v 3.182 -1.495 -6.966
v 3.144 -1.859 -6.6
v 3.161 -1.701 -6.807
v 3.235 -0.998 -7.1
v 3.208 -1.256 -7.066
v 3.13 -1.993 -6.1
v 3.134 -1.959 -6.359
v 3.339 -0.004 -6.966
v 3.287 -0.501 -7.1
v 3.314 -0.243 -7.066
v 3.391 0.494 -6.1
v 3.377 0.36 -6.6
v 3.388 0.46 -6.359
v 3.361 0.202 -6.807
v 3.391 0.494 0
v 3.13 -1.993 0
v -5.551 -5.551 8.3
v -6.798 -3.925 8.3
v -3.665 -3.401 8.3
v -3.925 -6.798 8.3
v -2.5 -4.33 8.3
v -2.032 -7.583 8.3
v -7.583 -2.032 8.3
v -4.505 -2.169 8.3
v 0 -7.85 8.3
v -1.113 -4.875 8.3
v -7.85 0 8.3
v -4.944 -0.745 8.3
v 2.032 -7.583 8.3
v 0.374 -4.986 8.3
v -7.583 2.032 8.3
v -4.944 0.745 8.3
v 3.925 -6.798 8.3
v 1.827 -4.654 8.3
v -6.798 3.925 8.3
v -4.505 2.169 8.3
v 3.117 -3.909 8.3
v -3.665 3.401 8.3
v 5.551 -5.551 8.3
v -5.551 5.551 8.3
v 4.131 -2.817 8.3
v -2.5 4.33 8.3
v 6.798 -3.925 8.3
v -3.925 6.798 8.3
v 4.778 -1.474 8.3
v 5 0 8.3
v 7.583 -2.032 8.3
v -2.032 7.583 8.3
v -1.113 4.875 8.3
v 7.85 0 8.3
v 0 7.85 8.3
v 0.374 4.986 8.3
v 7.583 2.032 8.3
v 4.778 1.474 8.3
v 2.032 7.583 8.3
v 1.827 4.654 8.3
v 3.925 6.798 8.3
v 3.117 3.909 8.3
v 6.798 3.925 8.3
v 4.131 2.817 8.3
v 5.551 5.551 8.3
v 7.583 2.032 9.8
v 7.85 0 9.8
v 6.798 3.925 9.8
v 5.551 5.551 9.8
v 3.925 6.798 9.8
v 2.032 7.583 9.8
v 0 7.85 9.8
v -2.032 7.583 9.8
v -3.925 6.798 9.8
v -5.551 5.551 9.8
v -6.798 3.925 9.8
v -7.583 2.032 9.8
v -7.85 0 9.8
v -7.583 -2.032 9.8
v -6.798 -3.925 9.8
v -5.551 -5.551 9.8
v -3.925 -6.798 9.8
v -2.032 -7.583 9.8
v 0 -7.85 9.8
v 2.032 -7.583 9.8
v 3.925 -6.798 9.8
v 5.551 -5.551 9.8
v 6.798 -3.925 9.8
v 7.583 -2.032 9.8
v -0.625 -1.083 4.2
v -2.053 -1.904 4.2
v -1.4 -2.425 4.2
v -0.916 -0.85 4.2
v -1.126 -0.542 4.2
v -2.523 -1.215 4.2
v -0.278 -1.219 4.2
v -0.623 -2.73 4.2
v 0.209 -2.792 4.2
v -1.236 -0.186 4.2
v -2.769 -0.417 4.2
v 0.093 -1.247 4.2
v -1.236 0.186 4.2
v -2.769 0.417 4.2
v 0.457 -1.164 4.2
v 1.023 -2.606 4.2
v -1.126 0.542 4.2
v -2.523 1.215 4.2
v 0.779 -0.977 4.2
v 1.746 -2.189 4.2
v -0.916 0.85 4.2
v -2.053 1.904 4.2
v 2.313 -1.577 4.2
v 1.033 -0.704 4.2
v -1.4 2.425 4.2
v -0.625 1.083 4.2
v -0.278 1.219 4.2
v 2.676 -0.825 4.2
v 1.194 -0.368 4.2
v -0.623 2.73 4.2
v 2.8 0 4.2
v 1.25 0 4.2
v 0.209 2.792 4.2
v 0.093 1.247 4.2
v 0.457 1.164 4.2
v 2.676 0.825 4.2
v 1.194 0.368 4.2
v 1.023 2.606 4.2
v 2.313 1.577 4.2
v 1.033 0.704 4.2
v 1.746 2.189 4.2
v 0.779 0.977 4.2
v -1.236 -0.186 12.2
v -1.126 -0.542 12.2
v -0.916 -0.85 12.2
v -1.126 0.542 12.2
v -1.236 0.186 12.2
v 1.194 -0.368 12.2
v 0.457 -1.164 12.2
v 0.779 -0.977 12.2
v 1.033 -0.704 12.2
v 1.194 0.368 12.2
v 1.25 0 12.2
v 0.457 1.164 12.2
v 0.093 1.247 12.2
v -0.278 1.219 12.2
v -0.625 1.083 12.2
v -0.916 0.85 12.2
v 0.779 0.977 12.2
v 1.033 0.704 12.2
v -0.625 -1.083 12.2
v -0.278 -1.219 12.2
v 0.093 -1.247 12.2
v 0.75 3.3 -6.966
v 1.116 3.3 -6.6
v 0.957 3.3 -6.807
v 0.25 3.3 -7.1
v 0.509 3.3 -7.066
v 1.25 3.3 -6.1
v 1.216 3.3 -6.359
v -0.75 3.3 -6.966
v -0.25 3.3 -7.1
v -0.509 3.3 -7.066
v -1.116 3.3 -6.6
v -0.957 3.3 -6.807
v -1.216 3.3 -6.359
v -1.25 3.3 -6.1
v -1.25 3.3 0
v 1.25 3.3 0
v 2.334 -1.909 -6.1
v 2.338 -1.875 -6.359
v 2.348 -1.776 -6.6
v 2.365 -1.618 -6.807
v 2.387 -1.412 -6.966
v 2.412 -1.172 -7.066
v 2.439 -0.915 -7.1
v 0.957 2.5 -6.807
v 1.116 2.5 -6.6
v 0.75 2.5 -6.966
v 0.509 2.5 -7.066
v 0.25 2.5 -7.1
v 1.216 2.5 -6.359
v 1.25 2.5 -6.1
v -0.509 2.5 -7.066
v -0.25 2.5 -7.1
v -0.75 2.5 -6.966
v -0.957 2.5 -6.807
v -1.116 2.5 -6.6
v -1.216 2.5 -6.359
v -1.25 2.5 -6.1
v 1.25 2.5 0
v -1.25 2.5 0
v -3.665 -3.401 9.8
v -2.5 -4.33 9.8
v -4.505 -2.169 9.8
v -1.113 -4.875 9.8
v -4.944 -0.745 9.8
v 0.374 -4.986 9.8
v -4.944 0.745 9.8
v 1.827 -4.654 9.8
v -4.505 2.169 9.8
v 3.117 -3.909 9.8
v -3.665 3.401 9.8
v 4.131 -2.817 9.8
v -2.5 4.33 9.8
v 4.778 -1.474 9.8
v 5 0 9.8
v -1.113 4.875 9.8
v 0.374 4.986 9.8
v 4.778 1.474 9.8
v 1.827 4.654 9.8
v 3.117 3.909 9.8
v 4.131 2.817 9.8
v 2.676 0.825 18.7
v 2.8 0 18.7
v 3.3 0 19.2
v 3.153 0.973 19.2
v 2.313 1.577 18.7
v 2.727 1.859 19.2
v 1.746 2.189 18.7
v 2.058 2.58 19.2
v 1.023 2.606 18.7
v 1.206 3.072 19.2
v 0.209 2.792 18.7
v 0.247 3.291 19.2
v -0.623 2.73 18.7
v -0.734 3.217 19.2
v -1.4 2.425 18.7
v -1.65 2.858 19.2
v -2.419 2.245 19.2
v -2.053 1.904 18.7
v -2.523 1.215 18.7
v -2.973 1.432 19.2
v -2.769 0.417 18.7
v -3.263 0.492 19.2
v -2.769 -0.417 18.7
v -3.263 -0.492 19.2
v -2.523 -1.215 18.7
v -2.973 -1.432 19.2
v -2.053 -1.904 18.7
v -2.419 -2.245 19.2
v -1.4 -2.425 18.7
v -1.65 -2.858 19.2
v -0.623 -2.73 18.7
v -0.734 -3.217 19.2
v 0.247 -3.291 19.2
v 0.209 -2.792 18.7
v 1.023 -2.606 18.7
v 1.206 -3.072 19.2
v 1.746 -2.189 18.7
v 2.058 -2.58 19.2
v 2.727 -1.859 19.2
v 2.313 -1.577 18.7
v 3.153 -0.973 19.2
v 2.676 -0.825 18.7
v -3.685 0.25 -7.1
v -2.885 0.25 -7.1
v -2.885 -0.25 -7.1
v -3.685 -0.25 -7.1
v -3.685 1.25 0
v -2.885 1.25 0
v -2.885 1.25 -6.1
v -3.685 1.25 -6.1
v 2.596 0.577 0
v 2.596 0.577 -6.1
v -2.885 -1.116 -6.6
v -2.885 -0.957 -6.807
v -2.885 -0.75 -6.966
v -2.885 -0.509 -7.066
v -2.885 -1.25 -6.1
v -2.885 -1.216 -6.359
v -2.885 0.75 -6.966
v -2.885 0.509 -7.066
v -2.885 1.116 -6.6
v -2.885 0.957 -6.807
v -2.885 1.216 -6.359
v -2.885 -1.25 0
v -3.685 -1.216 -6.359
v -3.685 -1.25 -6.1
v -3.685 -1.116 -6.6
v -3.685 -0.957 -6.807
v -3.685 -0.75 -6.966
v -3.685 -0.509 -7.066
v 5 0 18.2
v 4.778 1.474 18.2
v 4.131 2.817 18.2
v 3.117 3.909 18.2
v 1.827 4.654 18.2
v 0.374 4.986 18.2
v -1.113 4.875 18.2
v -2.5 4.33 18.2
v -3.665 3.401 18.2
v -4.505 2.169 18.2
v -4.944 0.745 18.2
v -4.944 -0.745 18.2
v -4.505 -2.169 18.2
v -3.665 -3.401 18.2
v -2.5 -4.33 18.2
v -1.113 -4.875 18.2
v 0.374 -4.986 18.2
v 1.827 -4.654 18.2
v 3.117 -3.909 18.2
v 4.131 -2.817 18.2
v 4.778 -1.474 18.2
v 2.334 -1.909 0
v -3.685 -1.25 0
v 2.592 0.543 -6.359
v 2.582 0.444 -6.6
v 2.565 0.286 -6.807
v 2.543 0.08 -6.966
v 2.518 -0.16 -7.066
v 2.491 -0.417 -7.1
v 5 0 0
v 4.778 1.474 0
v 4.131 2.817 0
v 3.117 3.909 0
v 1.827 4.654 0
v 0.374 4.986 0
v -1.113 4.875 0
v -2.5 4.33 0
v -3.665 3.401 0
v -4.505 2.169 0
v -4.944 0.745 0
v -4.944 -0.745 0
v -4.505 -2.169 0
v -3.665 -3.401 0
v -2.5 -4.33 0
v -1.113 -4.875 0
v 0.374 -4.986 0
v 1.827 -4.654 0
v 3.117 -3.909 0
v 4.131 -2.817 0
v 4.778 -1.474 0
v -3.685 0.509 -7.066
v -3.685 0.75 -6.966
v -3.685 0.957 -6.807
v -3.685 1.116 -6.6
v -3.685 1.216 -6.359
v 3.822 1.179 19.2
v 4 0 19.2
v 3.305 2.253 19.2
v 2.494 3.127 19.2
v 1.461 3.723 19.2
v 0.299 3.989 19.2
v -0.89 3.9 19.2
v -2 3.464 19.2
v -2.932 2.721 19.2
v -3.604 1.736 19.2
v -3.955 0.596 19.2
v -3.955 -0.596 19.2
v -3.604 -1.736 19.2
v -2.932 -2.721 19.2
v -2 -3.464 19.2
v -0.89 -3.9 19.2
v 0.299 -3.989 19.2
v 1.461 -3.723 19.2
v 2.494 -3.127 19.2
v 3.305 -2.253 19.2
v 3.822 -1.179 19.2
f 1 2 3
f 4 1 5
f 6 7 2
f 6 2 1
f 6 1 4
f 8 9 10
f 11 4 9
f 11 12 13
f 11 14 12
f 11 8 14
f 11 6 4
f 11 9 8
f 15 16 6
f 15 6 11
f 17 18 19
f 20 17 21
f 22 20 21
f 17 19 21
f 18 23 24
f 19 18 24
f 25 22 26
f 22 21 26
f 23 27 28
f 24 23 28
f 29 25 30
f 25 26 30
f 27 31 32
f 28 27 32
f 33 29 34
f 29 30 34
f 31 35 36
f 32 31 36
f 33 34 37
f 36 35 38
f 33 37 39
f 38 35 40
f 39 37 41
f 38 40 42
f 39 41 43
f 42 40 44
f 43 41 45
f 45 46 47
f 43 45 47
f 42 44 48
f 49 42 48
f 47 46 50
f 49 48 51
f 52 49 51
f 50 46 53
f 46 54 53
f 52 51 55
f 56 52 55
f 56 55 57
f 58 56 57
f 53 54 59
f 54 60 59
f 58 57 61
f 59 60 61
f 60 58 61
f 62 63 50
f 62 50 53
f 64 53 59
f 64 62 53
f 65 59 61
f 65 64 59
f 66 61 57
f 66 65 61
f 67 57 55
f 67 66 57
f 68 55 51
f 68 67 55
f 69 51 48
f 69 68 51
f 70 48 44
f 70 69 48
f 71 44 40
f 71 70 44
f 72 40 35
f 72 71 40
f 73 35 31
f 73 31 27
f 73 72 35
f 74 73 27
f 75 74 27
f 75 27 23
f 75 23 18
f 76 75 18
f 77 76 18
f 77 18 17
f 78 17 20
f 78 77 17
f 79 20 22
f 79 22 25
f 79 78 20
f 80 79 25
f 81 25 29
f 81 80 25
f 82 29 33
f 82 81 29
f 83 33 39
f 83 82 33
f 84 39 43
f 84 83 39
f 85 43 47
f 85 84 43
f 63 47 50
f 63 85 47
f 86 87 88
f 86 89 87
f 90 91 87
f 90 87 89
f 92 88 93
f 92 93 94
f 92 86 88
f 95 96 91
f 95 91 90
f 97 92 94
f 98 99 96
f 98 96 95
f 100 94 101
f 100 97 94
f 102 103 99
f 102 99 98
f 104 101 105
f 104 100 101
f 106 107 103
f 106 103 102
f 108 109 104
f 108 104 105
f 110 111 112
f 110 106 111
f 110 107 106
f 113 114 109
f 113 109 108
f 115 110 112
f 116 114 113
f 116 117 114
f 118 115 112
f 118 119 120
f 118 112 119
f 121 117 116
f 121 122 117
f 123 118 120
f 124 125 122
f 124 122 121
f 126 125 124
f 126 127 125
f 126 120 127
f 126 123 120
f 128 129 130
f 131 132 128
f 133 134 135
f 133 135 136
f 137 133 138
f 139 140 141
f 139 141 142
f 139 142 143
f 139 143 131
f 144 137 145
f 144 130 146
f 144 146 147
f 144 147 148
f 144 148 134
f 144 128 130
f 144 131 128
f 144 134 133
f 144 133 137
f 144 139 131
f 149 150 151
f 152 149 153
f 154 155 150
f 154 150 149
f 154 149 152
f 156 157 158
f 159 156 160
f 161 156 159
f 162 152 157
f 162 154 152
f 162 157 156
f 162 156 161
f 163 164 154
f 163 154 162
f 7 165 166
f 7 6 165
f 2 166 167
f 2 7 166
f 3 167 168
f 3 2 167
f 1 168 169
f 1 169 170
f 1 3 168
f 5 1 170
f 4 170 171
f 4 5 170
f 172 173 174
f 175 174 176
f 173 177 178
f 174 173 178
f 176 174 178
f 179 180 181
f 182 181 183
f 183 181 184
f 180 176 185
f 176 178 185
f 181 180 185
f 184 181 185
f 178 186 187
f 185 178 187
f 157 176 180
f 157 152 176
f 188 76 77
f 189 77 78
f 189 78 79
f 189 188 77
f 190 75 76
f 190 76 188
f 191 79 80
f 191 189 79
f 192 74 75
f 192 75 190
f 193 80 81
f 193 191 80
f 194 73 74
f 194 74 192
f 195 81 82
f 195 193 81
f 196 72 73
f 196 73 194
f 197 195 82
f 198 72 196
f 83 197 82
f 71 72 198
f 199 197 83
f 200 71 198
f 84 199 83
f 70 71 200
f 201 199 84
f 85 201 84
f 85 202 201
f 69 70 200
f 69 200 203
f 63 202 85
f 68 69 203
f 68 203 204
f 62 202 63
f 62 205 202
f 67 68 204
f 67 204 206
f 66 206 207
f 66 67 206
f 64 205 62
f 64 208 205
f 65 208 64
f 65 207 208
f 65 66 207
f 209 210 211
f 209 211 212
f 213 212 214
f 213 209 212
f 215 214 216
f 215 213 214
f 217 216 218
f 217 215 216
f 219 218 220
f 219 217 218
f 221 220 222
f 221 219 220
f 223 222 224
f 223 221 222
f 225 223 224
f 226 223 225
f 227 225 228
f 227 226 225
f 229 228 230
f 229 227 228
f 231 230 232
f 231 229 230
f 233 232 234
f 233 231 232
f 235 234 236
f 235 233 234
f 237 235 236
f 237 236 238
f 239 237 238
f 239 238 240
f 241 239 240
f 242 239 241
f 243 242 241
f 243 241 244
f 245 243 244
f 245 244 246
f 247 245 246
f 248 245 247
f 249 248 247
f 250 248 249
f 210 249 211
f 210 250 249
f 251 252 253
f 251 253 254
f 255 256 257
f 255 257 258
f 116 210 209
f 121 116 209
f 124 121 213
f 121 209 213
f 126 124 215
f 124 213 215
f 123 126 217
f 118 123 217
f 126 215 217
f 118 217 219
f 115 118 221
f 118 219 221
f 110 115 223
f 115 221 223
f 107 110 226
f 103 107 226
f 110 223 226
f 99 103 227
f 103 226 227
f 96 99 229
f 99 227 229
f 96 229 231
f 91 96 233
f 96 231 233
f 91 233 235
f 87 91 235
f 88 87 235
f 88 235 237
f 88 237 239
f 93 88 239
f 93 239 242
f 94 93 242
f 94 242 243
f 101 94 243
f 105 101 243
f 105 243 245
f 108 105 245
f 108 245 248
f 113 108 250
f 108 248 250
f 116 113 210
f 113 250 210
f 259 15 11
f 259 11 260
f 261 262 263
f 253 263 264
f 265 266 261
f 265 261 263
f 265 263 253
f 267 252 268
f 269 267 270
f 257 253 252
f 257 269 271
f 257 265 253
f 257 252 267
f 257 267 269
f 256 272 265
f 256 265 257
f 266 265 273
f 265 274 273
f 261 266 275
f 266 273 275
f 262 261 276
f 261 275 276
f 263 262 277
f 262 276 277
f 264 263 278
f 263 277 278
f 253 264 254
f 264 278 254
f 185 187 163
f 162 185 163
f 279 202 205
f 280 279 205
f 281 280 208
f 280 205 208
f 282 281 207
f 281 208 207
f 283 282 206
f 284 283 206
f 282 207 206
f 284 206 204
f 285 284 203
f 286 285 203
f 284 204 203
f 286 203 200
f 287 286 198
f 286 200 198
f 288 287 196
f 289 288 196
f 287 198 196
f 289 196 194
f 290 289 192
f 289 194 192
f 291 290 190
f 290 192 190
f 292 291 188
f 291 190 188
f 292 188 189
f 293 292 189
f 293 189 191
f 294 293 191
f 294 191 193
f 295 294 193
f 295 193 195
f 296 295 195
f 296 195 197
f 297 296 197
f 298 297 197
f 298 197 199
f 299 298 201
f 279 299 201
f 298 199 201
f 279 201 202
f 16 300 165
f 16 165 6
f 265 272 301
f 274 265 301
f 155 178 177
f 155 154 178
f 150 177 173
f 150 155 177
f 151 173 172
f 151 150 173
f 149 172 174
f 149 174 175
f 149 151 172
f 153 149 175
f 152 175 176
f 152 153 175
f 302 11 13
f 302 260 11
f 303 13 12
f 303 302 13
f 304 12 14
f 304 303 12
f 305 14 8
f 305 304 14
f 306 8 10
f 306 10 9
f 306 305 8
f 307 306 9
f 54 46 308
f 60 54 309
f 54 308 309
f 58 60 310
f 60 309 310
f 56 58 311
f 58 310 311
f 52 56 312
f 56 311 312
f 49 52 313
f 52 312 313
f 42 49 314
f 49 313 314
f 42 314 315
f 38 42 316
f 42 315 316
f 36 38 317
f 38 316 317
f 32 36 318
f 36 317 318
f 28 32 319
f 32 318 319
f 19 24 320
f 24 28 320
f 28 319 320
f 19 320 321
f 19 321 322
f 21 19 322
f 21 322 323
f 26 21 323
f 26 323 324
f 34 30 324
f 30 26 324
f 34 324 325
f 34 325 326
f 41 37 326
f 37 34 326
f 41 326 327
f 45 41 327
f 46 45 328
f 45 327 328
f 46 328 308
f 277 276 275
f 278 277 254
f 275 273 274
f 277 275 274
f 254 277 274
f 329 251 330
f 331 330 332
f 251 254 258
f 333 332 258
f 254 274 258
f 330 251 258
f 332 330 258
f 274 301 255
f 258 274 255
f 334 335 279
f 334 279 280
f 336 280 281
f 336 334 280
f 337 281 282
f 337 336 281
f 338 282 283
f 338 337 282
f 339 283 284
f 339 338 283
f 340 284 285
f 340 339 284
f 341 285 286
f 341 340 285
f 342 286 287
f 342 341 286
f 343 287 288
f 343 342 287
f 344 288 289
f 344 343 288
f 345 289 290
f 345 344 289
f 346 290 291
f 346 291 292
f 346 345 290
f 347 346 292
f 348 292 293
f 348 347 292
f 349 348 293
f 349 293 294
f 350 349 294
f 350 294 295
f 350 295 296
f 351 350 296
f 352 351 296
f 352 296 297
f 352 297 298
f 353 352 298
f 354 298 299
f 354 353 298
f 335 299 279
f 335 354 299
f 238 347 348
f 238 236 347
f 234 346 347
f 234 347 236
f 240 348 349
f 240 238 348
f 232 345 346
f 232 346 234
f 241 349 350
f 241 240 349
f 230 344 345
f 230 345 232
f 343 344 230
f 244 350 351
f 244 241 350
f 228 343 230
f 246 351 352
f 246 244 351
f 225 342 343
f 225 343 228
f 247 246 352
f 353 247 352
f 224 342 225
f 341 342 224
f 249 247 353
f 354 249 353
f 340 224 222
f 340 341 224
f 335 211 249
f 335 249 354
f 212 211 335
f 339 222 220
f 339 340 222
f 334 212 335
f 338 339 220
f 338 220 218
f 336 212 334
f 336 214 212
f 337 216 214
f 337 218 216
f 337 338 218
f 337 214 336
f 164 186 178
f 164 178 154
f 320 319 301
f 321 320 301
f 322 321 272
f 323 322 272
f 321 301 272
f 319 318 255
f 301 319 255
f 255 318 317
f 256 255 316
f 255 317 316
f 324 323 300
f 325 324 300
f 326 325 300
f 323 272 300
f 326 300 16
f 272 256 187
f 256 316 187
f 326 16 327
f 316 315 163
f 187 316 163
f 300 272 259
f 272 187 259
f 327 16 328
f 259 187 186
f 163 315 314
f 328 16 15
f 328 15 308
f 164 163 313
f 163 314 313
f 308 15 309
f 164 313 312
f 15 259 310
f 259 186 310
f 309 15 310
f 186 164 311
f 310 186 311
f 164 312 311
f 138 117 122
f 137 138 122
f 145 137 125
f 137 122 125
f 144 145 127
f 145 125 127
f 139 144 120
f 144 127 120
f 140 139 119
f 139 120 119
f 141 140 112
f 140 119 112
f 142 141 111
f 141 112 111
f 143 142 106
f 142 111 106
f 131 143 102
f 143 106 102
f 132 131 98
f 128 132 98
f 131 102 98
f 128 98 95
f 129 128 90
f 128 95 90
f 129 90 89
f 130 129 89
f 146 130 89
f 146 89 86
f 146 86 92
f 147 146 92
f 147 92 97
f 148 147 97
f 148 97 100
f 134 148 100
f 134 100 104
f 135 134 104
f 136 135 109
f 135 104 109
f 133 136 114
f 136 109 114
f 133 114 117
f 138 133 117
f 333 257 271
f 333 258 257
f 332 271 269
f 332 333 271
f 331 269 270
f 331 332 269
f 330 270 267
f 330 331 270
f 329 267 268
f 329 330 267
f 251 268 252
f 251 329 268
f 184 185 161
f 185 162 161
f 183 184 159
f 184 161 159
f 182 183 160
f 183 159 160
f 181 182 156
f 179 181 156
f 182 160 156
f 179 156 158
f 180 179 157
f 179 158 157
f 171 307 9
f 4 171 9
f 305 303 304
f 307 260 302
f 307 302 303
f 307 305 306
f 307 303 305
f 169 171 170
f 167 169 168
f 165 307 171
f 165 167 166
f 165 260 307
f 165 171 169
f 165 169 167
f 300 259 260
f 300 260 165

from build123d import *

# Parameters (mm, degrees)
SKETCH1_R           = 5
BOSS_EXTRUDE1_DEPTH = 9.8
SKETCH2_R           = 7.85
BOSS_EXTRUDE2_DEPTH = 1.5
SKETCH3_R           = 5
BOSS_EXTRUDE3_DEPTH = 9.4
SKETCH4_W           = 2.5
SKETCH4_H           = 0.8
SKETCH4_W_2         = 0.8
SKETCH4_H_2         = 2.5
BOSS_EXTRUDE4_DEPTH = 7.1
FILLET1_R           = 1
SKETCH6_R           = 2.8
CUT_EXTRUDE1_DEPTH  = 15
SKETCH7_R           = 1.25
BOSS_EXTRUDE5_DEPTH = 8
CHAMFER1_SIZE       = 1
CHAMFER2_SIZE       = 0.5


with BuildPart() as part:
    # Sketch1 → Boss-Extrude1 (new body)
    with BuildSketch(Plane.XY):
        Circle(SKETCH1_R)
    extrude(amount=BOSS_EXTRUDE1_DEPTH)

    # Sketch2 → Boss-Extrude2 (add)
    with BuildSketch(Plane.XY.offset(9.8)):
        Circle(SKETCH2_R)
    extrude(amount=-BOSS_EXTRUDE2_DEPTH)

    # Sketch3 → Boss-Extrude3 (add)
    with BuildSketch(Plane.XY.offset(9.8)):
        Circle(SKETCH3_R)
    extrude(amount=BOSS_EXTRUDE3_DEPTH)

    # Sketch4 → Boss-Extrude4 (add)
    with BuildSketch(Plane(origin=(0, 0, 0), x_dir=(-1, 0, 0), z_dir=(0, 0, -1))):
        with Locations((0, 2.9)):
            Rectangle(SKETCH4_W, SKETCH4_H)
        with Locations((3.285473872, 0)):
            Rectangle(SKETCH4_W_2, SKETCH4_H_2)
        Polygon((-3.130059347, -1.992660833), (-3.391380505, 0.493643905), (-2.595762989, 0.577266676), (-2.33444183, -1.909038062), align=None)
    extrude(amount=BOSS_EXTRUDE4_DEPTH)

    # Fillet1
    fillet1_edges = [part.edges().sort_by_distance(p)[0] for p in [
        (1.25, 2.9, -7.1),
        (-1.25, 2.9, -7.1),
        (-3.285473872, 1.25, -7.1),
        (-3.285473872, -1.25, -7.1),
        (2.732250589, -1.950849448, -7.1),
        (2.993571747, 0.535455291, -7.1),
    ]]
    fillet(fillet1_edges, radius=FILLET1_R)

    # Sketch6 → Cut-Extrude1 (cut)
    with BuildSketch(Plane.XY.offset(19.2)):
        Circle(SKETCH6_R)
    extrude(amount=-CUT_EXTRUDE1_DEPTH, mode=Mode.SUBTRACT)

    # Sketch7 → Boss-Extrude5 (add)
    with BuildSketch(Plane.XY.offset(4.2)):
        Circle(SKETCH7_R)
    extrude(amount=BOSS_EXTRUDE5_DEPTH)

    # Chamfer1
    chamfer1_edges = [part.edges().sort_by_distance(p)[0] for p in [
        (-5, 0, 19.2),
    ]]
    chamfer(chamfer1_edges, length=CHAMFER1_SIZE)

    # Chamfer2
    chamfer2_edges = [part.edges().sort_by_distance(p)[0] for p in [
        (-2.8, 0, 19.2),
    ]]
    chamfer(chamfer2_edges, length=CHAMFER2_SIZE)


solid = part.part
